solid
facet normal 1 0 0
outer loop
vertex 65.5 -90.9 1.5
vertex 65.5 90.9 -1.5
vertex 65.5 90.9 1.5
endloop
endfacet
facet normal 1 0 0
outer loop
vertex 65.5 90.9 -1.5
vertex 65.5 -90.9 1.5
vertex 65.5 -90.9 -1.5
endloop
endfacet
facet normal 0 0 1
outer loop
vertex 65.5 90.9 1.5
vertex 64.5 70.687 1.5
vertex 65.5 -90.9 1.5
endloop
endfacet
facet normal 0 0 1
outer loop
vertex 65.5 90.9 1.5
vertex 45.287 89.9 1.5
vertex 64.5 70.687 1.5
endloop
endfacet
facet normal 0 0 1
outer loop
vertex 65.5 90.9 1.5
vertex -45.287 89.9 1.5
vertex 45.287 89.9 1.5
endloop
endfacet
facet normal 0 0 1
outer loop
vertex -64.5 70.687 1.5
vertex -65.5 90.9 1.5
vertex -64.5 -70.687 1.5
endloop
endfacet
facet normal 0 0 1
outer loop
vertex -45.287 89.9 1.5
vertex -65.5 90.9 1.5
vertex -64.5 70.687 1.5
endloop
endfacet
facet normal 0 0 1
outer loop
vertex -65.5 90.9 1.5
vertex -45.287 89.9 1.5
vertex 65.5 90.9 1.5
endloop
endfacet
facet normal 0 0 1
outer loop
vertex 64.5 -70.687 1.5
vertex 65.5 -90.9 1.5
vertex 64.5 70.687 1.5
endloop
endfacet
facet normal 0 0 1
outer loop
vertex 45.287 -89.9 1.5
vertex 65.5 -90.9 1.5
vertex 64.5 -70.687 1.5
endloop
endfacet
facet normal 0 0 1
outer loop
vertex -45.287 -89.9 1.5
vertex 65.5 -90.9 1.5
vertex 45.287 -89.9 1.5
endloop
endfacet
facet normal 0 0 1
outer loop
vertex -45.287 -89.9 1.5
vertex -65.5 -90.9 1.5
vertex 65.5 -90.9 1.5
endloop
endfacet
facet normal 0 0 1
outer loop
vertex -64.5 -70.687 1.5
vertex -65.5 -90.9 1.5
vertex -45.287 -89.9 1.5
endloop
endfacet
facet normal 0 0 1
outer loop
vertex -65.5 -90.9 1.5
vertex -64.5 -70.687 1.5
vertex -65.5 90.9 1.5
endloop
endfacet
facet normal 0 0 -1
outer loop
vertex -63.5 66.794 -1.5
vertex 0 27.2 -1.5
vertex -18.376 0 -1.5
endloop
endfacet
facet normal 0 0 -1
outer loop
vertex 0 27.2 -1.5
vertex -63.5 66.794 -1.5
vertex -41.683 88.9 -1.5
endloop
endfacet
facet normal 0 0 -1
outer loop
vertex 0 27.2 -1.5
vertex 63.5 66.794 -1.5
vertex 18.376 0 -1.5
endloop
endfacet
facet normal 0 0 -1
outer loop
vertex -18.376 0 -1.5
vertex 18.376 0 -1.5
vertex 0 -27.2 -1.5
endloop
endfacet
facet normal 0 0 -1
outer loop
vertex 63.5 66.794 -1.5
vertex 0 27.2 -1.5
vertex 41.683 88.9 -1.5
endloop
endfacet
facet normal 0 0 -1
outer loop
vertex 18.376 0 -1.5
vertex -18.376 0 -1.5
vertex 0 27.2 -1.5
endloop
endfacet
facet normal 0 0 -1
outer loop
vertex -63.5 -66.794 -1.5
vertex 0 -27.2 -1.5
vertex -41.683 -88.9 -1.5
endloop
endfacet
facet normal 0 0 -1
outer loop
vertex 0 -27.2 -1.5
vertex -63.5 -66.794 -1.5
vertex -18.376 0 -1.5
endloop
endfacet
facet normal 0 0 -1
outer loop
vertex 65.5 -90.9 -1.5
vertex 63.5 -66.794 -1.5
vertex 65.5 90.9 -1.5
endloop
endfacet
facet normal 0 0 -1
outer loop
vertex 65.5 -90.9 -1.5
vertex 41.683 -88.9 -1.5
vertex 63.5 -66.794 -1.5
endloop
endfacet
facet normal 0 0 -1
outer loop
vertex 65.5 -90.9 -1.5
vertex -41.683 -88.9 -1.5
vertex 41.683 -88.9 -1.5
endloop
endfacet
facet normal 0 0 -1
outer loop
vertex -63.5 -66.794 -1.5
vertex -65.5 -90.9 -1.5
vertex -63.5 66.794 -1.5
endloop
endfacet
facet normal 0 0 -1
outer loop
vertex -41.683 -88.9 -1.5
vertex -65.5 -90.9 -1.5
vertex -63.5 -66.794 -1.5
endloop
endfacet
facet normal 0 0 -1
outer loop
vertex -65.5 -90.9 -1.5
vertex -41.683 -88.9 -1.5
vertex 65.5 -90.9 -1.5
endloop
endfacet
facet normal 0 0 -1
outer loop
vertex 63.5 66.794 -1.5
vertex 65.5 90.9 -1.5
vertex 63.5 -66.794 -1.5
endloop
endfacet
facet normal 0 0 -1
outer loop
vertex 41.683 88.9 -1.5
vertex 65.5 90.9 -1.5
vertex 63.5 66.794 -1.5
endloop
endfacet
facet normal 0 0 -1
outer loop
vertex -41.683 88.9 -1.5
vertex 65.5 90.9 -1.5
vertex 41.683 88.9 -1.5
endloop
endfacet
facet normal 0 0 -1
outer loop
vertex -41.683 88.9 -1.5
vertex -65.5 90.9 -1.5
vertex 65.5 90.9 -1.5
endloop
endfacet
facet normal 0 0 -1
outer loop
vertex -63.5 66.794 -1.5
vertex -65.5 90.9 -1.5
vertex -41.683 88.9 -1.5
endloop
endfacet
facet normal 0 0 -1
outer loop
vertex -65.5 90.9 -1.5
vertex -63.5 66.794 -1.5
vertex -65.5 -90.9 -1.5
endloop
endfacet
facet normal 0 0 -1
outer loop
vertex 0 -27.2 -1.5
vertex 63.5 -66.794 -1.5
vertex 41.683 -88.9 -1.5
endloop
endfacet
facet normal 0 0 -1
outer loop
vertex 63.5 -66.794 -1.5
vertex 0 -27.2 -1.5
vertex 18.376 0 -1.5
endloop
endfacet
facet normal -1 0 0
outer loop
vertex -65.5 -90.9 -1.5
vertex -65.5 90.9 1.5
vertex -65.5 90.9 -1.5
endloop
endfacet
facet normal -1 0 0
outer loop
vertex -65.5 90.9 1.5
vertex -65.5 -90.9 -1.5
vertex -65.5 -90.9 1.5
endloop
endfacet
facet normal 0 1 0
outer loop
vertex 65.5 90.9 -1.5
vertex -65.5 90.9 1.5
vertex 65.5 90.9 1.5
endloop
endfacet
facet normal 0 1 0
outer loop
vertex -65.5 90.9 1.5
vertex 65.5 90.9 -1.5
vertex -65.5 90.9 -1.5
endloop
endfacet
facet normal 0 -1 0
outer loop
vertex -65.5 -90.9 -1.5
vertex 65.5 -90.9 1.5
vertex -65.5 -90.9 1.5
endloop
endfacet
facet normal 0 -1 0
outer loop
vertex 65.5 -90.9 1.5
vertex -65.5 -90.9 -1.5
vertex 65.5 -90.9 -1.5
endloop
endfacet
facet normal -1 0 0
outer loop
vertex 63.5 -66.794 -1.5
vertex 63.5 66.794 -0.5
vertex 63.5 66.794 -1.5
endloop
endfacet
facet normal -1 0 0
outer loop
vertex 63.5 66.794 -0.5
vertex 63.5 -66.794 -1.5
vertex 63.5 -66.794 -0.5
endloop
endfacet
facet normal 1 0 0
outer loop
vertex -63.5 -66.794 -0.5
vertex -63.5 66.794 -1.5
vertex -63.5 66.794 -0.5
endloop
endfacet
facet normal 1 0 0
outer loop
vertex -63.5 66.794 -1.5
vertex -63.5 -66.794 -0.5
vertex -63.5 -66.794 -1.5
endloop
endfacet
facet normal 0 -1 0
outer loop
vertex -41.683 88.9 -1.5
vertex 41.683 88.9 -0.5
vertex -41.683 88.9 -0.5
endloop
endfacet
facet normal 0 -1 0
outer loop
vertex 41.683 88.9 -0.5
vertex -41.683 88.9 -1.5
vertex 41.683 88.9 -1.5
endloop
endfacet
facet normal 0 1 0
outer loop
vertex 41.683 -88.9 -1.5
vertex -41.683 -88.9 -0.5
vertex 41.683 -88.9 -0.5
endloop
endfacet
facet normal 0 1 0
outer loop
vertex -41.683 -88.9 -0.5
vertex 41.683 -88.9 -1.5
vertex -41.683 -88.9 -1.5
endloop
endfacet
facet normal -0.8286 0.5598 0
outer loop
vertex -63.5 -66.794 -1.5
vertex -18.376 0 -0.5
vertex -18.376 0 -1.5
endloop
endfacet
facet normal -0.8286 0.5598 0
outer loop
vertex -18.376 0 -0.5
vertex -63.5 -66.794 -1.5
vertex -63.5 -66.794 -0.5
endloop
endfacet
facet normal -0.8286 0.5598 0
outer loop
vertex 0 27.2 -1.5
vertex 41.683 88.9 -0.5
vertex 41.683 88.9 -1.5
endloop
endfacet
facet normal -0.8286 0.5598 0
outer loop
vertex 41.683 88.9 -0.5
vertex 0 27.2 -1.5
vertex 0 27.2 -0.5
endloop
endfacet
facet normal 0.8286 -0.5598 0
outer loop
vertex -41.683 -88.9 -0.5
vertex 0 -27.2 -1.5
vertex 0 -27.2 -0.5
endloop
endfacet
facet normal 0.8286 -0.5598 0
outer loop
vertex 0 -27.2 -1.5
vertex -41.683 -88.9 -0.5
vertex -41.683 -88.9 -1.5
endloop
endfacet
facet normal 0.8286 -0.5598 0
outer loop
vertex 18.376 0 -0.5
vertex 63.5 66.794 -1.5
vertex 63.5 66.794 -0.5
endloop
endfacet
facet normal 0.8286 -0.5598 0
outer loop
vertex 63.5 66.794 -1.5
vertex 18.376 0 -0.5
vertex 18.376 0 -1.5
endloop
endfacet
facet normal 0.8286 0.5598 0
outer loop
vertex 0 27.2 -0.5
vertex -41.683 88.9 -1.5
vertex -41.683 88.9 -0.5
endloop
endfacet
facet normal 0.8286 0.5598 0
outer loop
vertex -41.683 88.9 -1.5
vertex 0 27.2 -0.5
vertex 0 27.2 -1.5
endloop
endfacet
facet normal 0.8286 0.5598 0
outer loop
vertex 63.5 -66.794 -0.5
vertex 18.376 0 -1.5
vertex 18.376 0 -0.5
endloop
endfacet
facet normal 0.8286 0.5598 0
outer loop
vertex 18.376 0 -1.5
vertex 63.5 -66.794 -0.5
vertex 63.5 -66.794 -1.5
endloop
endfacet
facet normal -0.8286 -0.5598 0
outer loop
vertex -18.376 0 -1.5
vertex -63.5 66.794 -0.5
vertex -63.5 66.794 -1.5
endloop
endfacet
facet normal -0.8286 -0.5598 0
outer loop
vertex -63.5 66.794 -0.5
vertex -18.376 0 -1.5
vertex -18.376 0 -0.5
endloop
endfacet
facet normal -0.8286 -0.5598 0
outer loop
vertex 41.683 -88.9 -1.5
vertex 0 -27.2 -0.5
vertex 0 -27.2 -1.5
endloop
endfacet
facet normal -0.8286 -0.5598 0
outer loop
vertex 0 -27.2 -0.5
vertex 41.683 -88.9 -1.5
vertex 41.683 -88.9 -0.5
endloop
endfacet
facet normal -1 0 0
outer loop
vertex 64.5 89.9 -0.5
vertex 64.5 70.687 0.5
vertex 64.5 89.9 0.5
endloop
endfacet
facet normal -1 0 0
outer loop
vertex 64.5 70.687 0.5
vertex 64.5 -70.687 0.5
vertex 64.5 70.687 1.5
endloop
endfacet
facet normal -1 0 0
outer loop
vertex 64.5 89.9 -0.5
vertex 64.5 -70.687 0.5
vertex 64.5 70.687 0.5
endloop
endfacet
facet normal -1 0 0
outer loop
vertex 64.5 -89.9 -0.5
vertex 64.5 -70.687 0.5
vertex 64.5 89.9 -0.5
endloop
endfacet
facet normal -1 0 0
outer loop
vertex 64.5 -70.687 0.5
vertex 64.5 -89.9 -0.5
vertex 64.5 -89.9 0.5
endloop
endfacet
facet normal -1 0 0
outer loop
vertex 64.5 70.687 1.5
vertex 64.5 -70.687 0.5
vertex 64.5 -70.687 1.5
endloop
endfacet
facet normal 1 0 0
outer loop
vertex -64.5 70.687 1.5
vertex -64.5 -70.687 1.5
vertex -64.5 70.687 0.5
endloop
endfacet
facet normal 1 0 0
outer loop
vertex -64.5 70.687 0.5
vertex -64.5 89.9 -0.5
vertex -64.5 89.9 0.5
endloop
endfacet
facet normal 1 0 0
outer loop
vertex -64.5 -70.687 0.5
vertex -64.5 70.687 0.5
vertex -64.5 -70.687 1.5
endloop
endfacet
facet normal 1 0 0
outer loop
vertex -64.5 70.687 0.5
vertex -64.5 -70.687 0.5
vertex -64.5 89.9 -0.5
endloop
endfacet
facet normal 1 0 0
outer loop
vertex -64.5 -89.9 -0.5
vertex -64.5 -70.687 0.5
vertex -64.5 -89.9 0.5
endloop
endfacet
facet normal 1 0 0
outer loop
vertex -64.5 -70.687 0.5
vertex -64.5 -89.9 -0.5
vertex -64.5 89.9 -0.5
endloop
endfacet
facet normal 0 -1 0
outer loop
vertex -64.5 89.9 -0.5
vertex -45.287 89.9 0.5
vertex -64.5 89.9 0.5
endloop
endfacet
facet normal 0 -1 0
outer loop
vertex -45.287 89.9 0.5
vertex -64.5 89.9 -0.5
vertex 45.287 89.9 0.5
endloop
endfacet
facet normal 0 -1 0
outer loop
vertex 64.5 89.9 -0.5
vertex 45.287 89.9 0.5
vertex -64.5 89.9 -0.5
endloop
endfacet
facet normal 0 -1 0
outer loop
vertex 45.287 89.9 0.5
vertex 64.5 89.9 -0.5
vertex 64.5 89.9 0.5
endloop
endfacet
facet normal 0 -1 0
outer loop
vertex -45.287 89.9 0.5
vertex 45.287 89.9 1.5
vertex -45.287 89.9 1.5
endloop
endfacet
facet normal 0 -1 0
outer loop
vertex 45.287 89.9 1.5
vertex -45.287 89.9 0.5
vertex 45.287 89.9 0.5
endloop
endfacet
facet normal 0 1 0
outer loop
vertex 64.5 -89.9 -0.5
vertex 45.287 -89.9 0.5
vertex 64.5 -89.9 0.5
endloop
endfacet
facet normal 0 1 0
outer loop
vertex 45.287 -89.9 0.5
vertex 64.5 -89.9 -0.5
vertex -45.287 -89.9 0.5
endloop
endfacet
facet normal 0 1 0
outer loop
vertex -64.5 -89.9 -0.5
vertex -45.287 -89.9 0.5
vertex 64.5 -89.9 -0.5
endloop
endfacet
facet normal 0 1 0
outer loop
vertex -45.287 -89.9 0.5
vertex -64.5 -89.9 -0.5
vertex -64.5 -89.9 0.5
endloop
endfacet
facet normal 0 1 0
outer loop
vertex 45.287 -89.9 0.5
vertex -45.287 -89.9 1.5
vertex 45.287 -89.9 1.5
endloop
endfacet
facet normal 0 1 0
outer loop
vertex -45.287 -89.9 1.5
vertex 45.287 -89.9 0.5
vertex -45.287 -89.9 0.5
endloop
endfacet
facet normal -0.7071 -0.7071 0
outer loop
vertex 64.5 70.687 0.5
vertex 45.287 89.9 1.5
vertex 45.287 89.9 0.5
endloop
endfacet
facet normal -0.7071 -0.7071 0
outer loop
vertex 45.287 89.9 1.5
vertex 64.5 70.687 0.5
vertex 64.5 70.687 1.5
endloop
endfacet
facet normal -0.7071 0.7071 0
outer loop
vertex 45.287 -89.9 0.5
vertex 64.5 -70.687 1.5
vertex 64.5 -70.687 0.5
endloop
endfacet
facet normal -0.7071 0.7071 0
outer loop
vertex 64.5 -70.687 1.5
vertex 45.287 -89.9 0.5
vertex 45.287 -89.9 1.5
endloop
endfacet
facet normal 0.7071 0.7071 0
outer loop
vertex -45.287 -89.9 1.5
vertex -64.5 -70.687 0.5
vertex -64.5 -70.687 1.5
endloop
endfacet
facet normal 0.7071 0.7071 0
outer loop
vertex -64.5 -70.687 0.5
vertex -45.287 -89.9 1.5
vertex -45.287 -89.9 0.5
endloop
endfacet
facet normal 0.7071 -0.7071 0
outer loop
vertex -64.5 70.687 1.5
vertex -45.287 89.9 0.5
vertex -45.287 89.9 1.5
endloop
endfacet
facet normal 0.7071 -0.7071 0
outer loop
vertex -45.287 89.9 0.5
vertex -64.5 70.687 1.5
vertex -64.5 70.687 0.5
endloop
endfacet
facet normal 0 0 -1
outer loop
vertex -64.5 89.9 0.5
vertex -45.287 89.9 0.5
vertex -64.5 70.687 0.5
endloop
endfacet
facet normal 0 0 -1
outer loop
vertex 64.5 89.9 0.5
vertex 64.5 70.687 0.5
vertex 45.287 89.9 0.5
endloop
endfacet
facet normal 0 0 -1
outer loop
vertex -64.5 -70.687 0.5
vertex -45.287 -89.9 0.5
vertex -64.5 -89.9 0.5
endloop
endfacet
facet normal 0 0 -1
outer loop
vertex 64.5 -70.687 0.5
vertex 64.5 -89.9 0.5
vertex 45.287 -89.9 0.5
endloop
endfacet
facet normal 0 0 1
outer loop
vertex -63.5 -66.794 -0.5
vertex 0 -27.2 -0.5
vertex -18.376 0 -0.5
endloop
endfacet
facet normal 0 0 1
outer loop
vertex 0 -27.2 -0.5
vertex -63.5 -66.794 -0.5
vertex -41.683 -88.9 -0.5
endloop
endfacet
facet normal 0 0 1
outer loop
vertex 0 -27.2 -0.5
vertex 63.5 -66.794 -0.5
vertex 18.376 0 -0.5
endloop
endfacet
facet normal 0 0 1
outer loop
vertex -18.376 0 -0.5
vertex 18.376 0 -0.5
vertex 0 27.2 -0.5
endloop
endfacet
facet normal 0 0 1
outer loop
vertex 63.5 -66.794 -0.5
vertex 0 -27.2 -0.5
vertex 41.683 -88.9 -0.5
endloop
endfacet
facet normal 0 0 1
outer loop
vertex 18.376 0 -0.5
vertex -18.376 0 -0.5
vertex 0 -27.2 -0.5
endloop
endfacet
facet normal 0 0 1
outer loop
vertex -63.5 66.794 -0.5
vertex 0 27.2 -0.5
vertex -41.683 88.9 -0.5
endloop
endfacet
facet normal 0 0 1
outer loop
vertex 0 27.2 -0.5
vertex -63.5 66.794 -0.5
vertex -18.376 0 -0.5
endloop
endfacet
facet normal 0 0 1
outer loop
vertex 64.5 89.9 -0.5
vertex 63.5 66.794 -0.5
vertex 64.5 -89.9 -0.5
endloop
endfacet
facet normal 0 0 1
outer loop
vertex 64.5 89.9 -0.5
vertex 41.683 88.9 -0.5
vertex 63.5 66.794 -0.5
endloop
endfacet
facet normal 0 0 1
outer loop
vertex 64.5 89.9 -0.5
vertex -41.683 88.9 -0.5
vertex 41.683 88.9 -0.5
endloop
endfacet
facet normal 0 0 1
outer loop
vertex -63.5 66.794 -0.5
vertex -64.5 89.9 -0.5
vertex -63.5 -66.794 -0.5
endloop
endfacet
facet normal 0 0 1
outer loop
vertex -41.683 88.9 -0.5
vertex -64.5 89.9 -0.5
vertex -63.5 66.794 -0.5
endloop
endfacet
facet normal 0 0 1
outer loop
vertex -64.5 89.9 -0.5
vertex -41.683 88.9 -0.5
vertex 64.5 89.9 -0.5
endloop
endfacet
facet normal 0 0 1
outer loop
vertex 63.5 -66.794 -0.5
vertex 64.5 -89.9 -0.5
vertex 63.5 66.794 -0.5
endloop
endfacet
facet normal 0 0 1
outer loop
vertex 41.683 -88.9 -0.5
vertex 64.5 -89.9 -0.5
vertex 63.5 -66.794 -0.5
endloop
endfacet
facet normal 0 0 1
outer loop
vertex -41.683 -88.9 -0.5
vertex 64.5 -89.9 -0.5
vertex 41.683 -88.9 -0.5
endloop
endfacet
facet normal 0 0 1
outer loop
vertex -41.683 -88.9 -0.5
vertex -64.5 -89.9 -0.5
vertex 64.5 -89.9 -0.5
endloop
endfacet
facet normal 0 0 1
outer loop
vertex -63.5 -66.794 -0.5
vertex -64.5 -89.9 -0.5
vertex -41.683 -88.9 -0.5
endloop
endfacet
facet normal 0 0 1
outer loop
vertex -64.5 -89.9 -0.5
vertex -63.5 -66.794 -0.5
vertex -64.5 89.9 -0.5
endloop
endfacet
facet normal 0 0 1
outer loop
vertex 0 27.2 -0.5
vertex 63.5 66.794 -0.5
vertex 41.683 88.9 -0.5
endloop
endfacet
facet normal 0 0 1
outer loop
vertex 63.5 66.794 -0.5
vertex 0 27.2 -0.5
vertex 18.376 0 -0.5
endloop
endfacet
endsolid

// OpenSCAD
photo_width = 5*25.4;
photo_height = 7*25.4;

edge = 1;
overlap = 15;

tolerance = 1;
slot_thickness = 1;

frame_width = photo_width + 2 * edge + 2 * tolerance;
frame_height = photo_height + 2 * edge + 2 * tolerance;
frame_thickness = 2*edge + slot_thickness;

slot_width = photo_width + 2 * tolerance;
slot_height = photo_height + 2 * tolerance;

photo_angle = 80;
base_thickness = 3;

module frame_box() {
  // Frame
  cube([frame_width, frame_height, frame_thickness], center = true);
}

module corners() {
  translate([frame_width/2, frame_height/2, 0])
    rotate([0,0,45])
      cube(2*overlap, center = true);
  translate([frame_width/2, -frame_height/2, 0])
    rotate([0,0,45])
      cube(2*overlap, center = true);
  translate([-frame_width/2, -frame_height/2, 0])
    rotate([0,0,45])
      cube(2*overlap, center = true);
  translate([-frame_width/2, frame_height/2, 0])
    rotate([0,0,45])
      cube(2*overlap, center = true);
}

module frame_x() {
  overlap_side = sqrt(2) * overlap;
  echo("Overlap_side = ", overlap_side);
  theta_x = photo_width - overlap_side;
  theta_y = photo_height - overlap_side;
  echo("X: ",theta_x, "Y: ",theta_y);
  theta = atan2(theta_y, theta_x);
  echo("Theta: ",theta);

  x_width = cos(theta - 45)*overlap*2+1;
  echo("cos: ",cos(theta-45)," X_width: ", x_width);
  x_length = sqrt(pow(photo_width, 2) + pow(photo_height, 2));

  intersection() {
    frame_box();
    union() {
      rotate([0, 0, theta])
        cube([x_length, x_width, frame_thickness], center=true);
      rotate([0, 0, -theta])
        cube([x_length, x_width, frame_thickness], center=true);
    }
  }
}

module frame_outline() {
  difference() {
    frame_box();
    cube([slot_width - edge*2, slot_height - edge*2, frame_thickness + 1], center=true);
  }
}

module frame_corners() {
  intersection() {
    #corners();
    frame_box();
  }
}

module combine_frame() {
  union() {
    frame_outline();
    frame_x();
  }
}

difference() {
  union() {
    difference() {
      combine_frame();
      translate([0, 0, frame_thickness / 2])
        cube([slot_width, slot_height, frame_thickness], center=true);
    }
    frame_corners();
  }
  cube([slot_width, slot_height, slot_thickness], center=true);
}


/*
-------
|/   \|
|     |
|\   /|
-------
*/
